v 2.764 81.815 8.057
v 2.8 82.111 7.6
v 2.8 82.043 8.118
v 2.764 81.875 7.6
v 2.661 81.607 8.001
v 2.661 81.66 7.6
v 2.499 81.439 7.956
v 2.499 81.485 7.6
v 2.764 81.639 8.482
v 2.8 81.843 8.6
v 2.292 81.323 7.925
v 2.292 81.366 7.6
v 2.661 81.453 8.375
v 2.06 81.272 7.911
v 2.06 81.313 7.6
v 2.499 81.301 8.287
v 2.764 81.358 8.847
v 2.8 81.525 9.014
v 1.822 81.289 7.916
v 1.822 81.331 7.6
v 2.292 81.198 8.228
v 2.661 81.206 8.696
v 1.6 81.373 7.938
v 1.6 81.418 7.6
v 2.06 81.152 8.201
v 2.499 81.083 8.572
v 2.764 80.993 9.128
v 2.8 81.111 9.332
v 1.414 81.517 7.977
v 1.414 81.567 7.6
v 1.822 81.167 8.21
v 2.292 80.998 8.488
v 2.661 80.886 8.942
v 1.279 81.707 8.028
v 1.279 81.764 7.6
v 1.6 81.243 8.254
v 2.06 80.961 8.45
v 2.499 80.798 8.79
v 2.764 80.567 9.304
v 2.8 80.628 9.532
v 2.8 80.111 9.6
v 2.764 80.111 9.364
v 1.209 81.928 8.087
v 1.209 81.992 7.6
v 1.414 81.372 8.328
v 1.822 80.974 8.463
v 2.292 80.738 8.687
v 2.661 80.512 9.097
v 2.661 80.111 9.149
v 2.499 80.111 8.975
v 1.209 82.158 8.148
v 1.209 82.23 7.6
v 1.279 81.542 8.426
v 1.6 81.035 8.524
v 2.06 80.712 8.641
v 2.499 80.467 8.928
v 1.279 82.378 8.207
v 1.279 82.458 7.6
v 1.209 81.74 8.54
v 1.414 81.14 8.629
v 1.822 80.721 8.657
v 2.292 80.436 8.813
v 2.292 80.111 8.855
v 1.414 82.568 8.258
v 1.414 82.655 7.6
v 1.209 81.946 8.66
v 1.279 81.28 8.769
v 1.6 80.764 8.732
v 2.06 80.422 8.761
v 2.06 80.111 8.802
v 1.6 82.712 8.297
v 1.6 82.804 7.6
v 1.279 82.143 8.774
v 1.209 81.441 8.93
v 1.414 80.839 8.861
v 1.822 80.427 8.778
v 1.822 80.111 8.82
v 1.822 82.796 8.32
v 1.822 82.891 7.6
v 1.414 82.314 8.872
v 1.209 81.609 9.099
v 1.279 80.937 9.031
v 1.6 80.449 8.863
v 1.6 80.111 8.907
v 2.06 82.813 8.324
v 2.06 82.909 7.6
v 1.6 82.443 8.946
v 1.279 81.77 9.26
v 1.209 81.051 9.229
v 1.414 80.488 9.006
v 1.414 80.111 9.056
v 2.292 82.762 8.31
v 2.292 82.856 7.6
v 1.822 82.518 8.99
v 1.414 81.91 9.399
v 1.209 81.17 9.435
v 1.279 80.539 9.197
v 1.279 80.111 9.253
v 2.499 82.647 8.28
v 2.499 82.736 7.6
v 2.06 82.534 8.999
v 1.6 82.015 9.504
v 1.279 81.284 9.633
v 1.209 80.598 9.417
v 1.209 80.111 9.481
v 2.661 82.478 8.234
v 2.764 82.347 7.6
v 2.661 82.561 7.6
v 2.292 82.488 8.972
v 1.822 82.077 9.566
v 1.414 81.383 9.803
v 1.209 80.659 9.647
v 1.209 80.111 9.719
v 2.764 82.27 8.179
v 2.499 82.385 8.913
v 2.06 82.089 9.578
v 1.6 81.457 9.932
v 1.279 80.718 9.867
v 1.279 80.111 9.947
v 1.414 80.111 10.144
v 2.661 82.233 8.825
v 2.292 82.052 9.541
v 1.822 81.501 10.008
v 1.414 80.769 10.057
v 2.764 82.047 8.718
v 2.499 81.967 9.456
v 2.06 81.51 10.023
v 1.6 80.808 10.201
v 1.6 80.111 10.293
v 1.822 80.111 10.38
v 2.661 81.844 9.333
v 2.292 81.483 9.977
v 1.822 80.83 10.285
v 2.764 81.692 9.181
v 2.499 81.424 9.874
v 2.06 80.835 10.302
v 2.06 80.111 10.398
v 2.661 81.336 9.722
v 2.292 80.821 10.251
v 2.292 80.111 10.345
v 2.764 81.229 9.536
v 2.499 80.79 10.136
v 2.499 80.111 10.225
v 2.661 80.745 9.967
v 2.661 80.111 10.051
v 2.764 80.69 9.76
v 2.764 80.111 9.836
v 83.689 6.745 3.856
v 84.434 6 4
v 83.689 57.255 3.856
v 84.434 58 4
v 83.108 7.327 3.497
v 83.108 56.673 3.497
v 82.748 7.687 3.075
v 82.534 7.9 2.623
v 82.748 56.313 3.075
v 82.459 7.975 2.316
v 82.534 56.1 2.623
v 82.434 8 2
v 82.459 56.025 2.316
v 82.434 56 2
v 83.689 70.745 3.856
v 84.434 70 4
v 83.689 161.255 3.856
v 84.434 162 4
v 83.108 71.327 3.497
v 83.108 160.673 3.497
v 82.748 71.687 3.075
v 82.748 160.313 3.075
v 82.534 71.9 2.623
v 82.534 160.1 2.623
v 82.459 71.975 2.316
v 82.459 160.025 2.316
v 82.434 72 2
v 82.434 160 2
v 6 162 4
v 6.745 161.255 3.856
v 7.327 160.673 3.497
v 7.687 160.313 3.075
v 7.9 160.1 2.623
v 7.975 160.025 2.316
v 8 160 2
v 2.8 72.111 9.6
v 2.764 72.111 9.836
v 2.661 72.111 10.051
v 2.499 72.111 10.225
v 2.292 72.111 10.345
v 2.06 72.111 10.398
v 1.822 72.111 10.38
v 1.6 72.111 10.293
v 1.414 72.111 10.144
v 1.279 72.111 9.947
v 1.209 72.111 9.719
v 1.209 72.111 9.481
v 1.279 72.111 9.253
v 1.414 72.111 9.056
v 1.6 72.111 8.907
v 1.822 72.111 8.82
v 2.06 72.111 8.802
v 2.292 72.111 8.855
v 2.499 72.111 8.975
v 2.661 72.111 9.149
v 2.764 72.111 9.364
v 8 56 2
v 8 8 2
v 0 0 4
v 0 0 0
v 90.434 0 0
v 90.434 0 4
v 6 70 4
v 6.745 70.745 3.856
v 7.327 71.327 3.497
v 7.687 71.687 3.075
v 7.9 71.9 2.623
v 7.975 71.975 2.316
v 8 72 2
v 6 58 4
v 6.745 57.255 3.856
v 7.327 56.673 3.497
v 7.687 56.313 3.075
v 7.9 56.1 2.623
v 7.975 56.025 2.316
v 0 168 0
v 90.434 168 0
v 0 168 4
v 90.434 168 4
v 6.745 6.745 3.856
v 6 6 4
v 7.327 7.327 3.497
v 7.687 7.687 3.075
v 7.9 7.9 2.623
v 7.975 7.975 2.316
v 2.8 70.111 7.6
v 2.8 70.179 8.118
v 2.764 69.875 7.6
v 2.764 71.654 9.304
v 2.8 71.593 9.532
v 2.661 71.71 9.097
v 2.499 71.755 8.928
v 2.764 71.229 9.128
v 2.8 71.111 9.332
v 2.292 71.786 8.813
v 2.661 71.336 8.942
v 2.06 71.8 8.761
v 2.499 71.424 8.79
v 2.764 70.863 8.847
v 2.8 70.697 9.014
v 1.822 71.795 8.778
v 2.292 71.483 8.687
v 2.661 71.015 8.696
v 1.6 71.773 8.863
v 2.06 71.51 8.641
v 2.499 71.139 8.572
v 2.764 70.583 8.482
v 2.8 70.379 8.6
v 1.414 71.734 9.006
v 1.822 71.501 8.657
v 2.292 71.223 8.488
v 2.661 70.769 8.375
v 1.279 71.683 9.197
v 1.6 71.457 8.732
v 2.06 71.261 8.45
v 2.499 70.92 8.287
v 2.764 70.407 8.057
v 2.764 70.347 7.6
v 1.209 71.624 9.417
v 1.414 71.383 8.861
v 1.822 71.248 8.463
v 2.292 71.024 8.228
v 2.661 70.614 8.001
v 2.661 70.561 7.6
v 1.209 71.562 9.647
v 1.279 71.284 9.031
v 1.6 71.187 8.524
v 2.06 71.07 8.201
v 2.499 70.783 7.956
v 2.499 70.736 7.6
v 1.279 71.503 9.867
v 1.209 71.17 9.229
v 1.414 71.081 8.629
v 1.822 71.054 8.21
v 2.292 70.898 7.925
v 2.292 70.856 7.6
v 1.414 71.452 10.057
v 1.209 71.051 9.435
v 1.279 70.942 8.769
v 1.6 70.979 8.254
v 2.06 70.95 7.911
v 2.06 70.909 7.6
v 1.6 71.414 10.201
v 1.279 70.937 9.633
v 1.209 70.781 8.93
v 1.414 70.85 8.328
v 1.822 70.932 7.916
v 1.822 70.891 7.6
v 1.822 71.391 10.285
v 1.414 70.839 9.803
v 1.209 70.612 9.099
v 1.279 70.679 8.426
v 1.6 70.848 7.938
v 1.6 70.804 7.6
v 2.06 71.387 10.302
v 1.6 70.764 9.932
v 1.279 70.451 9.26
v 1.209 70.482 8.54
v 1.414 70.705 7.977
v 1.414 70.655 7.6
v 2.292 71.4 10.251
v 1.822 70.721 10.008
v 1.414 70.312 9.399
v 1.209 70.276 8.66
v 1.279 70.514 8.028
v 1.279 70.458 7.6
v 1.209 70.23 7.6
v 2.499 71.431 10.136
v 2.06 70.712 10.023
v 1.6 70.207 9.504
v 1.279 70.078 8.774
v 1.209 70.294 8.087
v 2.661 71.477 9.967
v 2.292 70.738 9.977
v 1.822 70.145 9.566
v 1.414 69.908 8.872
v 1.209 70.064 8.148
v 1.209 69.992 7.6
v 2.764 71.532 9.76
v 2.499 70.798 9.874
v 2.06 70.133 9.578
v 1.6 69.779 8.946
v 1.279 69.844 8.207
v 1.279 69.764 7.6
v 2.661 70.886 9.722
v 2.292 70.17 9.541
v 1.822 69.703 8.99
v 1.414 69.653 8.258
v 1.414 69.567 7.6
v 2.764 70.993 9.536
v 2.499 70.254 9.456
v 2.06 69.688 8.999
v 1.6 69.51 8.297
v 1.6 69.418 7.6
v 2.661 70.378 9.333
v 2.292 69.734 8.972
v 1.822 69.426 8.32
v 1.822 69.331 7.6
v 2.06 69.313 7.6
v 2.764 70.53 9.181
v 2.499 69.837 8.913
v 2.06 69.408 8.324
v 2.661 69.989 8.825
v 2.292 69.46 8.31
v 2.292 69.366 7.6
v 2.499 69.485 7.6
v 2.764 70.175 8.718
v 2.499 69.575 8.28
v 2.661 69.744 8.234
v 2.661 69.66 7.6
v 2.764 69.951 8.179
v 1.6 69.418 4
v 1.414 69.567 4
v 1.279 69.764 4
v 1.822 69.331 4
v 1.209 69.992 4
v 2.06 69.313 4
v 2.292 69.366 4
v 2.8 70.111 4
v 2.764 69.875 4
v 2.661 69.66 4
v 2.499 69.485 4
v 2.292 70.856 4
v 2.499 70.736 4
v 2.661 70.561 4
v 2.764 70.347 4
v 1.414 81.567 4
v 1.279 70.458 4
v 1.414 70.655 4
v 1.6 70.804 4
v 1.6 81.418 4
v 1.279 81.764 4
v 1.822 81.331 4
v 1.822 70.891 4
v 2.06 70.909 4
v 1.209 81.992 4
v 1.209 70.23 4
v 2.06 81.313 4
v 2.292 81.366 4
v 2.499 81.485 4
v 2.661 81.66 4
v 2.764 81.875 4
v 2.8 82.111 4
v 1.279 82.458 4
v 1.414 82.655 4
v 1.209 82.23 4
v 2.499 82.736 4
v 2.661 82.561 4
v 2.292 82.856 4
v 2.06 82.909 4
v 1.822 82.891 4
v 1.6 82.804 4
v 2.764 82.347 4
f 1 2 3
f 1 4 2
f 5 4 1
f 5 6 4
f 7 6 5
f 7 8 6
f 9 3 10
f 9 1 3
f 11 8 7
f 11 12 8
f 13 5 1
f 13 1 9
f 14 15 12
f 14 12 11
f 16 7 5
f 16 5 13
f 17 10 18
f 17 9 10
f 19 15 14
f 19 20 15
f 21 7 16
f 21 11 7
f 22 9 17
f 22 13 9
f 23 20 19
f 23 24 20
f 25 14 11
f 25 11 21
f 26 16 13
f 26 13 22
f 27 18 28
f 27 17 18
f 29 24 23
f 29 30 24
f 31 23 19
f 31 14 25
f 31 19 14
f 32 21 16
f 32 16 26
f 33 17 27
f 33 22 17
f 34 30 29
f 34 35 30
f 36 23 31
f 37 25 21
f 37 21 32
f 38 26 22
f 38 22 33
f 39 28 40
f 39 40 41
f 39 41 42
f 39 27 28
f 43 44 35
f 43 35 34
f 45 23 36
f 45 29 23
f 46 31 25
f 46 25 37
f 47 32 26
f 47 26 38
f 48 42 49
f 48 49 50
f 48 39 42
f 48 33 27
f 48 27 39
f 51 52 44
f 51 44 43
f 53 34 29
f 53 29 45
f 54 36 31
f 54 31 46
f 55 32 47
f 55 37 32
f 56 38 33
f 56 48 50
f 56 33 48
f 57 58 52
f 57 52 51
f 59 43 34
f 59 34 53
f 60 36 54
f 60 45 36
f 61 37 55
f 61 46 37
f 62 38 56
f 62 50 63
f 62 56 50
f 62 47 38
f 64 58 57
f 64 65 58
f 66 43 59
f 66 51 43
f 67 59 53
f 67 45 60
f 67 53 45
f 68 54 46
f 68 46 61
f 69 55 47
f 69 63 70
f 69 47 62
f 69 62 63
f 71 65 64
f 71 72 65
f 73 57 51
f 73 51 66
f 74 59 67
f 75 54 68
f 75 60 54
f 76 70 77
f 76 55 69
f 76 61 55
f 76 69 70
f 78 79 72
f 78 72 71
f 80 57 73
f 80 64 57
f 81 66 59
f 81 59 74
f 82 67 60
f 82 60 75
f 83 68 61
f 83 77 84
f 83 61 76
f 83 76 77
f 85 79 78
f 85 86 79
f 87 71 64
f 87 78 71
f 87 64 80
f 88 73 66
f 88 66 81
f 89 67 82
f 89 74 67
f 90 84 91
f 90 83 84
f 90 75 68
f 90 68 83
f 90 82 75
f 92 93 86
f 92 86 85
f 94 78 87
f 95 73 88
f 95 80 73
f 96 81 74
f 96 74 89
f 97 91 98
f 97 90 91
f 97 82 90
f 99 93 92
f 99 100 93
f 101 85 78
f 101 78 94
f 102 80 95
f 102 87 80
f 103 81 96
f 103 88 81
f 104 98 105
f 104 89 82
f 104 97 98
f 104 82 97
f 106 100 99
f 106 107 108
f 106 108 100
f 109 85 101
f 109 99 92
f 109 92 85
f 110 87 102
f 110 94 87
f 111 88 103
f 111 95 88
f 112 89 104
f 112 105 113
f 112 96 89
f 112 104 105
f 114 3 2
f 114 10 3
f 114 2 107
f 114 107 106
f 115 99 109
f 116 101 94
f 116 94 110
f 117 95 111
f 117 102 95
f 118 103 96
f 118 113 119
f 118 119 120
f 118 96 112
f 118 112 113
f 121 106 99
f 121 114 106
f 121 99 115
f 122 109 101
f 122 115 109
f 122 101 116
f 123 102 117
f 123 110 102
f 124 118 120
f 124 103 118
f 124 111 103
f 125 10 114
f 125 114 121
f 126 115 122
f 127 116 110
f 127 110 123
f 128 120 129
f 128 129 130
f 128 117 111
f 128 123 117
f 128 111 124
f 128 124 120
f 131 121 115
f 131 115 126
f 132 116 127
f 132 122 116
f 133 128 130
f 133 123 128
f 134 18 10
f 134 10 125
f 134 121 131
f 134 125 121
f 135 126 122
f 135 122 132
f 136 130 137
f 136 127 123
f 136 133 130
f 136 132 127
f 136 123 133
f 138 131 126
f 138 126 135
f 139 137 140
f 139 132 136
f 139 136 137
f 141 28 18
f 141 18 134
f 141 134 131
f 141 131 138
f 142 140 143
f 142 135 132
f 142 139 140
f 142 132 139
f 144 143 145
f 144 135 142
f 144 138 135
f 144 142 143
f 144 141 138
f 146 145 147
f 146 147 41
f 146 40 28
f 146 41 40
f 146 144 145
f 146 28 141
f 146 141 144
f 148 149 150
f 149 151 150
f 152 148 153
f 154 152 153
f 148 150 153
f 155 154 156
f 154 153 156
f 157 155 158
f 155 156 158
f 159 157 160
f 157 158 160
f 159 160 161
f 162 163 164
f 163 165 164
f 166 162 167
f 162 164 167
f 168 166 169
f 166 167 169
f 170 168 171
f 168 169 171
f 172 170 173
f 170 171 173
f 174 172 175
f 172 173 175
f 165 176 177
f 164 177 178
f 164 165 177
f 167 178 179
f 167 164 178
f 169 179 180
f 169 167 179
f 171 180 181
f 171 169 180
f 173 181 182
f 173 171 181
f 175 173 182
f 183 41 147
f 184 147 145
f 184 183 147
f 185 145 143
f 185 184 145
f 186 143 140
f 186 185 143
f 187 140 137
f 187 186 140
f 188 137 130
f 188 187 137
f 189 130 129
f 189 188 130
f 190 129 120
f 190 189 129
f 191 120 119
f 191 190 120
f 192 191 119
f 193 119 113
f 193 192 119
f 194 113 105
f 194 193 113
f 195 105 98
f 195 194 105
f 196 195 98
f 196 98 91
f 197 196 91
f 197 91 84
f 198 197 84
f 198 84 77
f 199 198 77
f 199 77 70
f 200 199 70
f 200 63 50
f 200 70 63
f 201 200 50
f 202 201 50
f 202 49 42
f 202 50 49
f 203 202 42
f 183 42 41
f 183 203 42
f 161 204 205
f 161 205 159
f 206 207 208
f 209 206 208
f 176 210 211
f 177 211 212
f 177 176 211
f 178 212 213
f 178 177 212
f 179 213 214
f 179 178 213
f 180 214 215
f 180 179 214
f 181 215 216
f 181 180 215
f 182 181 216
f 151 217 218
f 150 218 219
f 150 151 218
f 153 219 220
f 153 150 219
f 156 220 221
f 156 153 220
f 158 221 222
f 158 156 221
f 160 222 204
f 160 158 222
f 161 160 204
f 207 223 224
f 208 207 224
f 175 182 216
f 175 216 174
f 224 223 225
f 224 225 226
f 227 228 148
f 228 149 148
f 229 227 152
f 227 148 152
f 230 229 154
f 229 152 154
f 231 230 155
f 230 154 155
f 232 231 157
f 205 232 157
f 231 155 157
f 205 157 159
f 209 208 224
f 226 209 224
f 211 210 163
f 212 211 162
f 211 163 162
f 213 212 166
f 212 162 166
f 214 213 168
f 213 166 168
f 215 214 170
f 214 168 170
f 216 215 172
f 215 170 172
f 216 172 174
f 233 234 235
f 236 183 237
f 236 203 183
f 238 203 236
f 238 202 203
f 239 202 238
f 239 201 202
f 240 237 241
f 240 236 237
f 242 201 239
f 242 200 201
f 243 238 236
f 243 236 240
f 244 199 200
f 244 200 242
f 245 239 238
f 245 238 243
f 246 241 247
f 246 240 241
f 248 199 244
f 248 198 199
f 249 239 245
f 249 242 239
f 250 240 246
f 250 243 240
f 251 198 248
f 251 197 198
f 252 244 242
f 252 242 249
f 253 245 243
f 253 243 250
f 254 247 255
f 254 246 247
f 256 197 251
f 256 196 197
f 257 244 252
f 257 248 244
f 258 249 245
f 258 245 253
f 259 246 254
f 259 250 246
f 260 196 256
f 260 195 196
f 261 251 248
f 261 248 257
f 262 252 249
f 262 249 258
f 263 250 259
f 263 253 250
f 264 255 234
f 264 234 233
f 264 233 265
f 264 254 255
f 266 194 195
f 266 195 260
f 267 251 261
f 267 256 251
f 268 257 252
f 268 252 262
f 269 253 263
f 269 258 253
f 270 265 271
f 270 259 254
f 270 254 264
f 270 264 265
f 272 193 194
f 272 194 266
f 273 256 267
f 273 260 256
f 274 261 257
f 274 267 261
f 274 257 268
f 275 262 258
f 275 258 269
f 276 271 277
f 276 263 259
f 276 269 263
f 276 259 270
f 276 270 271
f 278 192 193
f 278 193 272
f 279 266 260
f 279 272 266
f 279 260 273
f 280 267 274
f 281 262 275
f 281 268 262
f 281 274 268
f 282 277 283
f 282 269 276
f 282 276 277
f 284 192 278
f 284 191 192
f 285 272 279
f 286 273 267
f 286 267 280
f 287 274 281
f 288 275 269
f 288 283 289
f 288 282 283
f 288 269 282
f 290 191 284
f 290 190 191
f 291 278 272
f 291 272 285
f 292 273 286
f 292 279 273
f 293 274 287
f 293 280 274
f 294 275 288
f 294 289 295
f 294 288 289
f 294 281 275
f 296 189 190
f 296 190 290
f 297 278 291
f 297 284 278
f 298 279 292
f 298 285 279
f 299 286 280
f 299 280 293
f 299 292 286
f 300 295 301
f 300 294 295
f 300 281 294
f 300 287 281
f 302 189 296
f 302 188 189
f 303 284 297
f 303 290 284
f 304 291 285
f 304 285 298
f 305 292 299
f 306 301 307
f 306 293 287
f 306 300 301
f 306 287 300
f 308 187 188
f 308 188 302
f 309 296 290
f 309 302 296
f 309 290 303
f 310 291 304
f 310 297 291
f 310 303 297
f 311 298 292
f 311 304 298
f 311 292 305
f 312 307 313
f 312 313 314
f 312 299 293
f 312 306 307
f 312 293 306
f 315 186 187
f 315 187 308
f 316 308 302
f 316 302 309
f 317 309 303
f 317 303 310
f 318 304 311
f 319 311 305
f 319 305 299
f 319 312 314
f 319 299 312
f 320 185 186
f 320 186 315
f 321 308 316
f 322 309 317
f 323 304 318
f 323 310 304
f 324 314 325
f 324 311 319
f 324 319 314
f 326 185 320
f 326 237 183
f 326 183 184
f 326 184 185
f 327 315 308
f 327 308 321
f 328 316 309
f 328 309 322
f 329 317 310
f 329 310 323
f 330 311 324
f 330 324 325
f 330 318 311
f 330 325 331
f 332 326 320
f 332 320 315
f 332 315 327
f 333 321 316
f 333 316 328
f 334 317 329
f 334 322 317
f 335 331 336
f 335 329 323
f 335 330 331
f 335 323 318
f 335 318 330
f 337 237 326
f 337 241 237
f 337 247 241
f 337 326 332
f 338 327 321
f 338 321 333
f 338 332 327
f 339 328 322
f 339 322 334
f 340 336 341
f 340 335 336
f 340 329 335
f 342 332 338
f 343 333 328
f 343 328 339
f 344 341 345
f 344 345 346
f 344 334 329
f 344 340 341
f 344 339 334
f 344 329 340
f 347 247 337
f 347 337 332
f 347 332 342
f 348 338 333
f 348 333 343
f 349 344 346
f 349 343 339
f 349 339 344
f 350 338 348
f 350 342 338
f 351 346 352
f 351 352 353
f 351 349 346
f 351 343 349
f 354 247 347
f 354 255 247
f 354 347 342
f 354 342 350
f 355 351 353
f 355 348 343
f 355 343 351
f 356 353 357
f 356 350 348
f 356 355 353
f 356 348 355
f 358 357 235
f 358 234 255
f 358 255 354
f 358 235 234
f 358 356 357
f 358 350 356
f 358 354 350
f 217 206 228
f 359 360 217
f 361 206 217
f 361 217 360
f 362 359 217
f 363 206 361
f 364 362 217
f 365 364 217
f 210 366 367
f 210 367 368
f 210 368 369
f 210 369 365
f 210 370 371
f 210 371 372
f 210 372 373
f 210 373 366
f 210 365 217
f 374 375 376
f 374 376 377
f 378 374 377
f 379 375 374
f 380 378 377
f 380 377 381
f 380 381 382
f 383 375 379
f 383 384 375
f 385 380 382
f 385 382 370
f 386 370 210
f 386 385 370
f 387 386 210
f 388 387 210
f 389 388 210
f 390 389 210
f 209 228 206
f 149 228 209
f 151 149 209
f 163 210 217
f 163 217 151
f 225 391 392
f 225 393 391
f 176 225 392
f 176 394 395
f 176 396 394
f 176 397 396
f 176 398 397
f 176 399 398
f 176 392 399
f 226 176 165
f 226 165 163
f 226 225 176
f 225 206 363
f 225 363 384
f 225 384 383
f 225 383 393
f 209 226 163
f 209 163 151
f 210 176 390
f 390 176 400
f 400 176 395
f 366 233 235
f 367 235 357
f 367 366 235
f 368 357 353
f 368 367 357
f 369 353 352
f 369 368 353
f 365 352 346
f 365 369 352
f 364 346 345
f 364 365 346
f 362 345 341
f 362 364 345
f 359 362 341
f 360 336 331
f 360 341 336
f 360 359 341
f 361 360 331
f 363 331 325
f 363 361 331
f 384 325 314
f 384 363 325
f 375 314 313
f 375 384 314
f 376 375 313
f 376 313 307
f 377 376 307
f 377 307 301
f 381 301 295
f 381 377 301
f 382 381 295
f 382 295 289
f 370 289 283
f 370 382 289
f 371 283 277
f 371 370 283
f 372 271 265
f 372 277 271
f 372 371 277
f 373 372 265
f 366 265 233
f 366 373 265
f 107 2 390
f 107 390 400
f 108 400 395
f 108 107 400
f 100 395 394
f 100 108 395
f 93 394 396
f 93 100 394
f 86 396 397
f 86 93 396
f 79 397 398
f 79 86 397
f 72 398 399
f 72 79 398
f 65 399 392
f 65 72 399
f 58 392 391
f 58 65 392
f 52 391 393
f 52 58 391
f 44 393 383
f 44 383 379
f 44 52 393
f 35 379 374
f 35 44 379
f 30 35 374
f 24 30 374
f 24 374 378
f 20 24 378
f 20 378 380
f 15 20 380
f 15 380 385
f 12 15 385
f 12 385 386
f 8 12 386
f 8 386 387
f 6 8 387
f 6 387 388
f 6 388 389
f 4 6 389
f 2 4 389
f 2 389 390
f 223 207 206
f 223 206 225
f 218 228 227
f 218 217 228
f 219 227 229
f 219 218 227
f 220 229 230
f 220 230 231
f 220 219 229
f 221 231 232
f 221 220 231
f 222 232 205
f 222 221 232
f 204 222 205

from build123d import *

# Parameters (mm, degrees)
SKETCH1_W           = 1130.428324658
SKETCH1_H           = 2100
BOSS_EXTRUDE1_DEPTH = 50
SKETCH3_W           = 930.428324658
SKETCH3_H           = 600
SKETCH3_H_2         = 1100
CUT_EXTRUDE1_DEPTH  = 25
FILLET1_R           = 25
SKETCH5_R           = 10
SCALE2_SCALE        = 0.25
SCALE3_SCALE        = 0.32


with BuildPart() as part:
    # Sketch1 → Boss-Extrude1 (new body)
    with BuildSketch(Plane.XY):
        with Locations((565.214162329, 1050)):
            Rectangle(SKETCH1_W, SKETCH1_H)
    extrude(amount=BOSS_EXTRUDE1_DEPTH)

    # Sketch3 → Cut-Extrude1 (cut)
    with BuildSketch(Plane.XY.offset(50)):
        with Locations((565.214162329, 400)):
            Rectangle(SKETCH3_W, SKETCH3_H)
        with Locations((565.214162329, 1450)):
            Rectangle(SKETCH3_W, SKETCH3_H_2)
    extrude(amount=-CUT_EXTRUDE1_DEPTH, mode=Mode.SUBTRACT)

    # Fillet1
    fillet1_edges = [part.edges().sort_by_distance(p)[0] for p in [
        (565.214162329, 100, 50),
        (100, 400, 50),
        (1030.428324658, 400, 50),
        (565.214162329, 700, 50),
        (100, 1450, 50),
        (565.214162329, 900, 50),
        (1030.428324658, 1450, 50),
        (565.214162329, 2000, 50),
    ]]
    fillet(fillet1_edges, radius=FILLET1_R - 0.0001)  # a hair under: the kernel refuses the full size

    # Sweep1: sweep along a path in Sketch4
    with BuildLine(Plane.ZY.offset(-25)) as sweep1_path:
        Line((50, 1026.385549177), (95, 1026.385549177))
        ThreePointArc((95, 1026.385549177), (112.67766953, 1019.063218707), (120, 1001.385549177))
        Line((120, 1001.385549177), (120, 901.385549177))
        ThreePointArc((120, 901.385549177), (112.67766953, 883.707879648), (95, 876.385549177))
        Line((95, 876.385549177), (48.369845226, 876.385549177))
    # Sketch5 → Sweep1 (sweep)
    with BuildSketch(Plane.XY.offset(50)):
        with Locations((25, 1026.385549177)):
            Circle(SKETCH5_R)
    sweep(path=sweep1_path.line)


with BuildPart() as part_1:
    # Scale2: scaled about (0, 0, 0)
    add(part.part.scale(SCALE2_SCALE))


with BuildPart() as part_2:
    # Scale3: scaled about (0, 0, 0)
    add(part_1.part.scale(SCALE3_SCALE))


solid = part_2.part
